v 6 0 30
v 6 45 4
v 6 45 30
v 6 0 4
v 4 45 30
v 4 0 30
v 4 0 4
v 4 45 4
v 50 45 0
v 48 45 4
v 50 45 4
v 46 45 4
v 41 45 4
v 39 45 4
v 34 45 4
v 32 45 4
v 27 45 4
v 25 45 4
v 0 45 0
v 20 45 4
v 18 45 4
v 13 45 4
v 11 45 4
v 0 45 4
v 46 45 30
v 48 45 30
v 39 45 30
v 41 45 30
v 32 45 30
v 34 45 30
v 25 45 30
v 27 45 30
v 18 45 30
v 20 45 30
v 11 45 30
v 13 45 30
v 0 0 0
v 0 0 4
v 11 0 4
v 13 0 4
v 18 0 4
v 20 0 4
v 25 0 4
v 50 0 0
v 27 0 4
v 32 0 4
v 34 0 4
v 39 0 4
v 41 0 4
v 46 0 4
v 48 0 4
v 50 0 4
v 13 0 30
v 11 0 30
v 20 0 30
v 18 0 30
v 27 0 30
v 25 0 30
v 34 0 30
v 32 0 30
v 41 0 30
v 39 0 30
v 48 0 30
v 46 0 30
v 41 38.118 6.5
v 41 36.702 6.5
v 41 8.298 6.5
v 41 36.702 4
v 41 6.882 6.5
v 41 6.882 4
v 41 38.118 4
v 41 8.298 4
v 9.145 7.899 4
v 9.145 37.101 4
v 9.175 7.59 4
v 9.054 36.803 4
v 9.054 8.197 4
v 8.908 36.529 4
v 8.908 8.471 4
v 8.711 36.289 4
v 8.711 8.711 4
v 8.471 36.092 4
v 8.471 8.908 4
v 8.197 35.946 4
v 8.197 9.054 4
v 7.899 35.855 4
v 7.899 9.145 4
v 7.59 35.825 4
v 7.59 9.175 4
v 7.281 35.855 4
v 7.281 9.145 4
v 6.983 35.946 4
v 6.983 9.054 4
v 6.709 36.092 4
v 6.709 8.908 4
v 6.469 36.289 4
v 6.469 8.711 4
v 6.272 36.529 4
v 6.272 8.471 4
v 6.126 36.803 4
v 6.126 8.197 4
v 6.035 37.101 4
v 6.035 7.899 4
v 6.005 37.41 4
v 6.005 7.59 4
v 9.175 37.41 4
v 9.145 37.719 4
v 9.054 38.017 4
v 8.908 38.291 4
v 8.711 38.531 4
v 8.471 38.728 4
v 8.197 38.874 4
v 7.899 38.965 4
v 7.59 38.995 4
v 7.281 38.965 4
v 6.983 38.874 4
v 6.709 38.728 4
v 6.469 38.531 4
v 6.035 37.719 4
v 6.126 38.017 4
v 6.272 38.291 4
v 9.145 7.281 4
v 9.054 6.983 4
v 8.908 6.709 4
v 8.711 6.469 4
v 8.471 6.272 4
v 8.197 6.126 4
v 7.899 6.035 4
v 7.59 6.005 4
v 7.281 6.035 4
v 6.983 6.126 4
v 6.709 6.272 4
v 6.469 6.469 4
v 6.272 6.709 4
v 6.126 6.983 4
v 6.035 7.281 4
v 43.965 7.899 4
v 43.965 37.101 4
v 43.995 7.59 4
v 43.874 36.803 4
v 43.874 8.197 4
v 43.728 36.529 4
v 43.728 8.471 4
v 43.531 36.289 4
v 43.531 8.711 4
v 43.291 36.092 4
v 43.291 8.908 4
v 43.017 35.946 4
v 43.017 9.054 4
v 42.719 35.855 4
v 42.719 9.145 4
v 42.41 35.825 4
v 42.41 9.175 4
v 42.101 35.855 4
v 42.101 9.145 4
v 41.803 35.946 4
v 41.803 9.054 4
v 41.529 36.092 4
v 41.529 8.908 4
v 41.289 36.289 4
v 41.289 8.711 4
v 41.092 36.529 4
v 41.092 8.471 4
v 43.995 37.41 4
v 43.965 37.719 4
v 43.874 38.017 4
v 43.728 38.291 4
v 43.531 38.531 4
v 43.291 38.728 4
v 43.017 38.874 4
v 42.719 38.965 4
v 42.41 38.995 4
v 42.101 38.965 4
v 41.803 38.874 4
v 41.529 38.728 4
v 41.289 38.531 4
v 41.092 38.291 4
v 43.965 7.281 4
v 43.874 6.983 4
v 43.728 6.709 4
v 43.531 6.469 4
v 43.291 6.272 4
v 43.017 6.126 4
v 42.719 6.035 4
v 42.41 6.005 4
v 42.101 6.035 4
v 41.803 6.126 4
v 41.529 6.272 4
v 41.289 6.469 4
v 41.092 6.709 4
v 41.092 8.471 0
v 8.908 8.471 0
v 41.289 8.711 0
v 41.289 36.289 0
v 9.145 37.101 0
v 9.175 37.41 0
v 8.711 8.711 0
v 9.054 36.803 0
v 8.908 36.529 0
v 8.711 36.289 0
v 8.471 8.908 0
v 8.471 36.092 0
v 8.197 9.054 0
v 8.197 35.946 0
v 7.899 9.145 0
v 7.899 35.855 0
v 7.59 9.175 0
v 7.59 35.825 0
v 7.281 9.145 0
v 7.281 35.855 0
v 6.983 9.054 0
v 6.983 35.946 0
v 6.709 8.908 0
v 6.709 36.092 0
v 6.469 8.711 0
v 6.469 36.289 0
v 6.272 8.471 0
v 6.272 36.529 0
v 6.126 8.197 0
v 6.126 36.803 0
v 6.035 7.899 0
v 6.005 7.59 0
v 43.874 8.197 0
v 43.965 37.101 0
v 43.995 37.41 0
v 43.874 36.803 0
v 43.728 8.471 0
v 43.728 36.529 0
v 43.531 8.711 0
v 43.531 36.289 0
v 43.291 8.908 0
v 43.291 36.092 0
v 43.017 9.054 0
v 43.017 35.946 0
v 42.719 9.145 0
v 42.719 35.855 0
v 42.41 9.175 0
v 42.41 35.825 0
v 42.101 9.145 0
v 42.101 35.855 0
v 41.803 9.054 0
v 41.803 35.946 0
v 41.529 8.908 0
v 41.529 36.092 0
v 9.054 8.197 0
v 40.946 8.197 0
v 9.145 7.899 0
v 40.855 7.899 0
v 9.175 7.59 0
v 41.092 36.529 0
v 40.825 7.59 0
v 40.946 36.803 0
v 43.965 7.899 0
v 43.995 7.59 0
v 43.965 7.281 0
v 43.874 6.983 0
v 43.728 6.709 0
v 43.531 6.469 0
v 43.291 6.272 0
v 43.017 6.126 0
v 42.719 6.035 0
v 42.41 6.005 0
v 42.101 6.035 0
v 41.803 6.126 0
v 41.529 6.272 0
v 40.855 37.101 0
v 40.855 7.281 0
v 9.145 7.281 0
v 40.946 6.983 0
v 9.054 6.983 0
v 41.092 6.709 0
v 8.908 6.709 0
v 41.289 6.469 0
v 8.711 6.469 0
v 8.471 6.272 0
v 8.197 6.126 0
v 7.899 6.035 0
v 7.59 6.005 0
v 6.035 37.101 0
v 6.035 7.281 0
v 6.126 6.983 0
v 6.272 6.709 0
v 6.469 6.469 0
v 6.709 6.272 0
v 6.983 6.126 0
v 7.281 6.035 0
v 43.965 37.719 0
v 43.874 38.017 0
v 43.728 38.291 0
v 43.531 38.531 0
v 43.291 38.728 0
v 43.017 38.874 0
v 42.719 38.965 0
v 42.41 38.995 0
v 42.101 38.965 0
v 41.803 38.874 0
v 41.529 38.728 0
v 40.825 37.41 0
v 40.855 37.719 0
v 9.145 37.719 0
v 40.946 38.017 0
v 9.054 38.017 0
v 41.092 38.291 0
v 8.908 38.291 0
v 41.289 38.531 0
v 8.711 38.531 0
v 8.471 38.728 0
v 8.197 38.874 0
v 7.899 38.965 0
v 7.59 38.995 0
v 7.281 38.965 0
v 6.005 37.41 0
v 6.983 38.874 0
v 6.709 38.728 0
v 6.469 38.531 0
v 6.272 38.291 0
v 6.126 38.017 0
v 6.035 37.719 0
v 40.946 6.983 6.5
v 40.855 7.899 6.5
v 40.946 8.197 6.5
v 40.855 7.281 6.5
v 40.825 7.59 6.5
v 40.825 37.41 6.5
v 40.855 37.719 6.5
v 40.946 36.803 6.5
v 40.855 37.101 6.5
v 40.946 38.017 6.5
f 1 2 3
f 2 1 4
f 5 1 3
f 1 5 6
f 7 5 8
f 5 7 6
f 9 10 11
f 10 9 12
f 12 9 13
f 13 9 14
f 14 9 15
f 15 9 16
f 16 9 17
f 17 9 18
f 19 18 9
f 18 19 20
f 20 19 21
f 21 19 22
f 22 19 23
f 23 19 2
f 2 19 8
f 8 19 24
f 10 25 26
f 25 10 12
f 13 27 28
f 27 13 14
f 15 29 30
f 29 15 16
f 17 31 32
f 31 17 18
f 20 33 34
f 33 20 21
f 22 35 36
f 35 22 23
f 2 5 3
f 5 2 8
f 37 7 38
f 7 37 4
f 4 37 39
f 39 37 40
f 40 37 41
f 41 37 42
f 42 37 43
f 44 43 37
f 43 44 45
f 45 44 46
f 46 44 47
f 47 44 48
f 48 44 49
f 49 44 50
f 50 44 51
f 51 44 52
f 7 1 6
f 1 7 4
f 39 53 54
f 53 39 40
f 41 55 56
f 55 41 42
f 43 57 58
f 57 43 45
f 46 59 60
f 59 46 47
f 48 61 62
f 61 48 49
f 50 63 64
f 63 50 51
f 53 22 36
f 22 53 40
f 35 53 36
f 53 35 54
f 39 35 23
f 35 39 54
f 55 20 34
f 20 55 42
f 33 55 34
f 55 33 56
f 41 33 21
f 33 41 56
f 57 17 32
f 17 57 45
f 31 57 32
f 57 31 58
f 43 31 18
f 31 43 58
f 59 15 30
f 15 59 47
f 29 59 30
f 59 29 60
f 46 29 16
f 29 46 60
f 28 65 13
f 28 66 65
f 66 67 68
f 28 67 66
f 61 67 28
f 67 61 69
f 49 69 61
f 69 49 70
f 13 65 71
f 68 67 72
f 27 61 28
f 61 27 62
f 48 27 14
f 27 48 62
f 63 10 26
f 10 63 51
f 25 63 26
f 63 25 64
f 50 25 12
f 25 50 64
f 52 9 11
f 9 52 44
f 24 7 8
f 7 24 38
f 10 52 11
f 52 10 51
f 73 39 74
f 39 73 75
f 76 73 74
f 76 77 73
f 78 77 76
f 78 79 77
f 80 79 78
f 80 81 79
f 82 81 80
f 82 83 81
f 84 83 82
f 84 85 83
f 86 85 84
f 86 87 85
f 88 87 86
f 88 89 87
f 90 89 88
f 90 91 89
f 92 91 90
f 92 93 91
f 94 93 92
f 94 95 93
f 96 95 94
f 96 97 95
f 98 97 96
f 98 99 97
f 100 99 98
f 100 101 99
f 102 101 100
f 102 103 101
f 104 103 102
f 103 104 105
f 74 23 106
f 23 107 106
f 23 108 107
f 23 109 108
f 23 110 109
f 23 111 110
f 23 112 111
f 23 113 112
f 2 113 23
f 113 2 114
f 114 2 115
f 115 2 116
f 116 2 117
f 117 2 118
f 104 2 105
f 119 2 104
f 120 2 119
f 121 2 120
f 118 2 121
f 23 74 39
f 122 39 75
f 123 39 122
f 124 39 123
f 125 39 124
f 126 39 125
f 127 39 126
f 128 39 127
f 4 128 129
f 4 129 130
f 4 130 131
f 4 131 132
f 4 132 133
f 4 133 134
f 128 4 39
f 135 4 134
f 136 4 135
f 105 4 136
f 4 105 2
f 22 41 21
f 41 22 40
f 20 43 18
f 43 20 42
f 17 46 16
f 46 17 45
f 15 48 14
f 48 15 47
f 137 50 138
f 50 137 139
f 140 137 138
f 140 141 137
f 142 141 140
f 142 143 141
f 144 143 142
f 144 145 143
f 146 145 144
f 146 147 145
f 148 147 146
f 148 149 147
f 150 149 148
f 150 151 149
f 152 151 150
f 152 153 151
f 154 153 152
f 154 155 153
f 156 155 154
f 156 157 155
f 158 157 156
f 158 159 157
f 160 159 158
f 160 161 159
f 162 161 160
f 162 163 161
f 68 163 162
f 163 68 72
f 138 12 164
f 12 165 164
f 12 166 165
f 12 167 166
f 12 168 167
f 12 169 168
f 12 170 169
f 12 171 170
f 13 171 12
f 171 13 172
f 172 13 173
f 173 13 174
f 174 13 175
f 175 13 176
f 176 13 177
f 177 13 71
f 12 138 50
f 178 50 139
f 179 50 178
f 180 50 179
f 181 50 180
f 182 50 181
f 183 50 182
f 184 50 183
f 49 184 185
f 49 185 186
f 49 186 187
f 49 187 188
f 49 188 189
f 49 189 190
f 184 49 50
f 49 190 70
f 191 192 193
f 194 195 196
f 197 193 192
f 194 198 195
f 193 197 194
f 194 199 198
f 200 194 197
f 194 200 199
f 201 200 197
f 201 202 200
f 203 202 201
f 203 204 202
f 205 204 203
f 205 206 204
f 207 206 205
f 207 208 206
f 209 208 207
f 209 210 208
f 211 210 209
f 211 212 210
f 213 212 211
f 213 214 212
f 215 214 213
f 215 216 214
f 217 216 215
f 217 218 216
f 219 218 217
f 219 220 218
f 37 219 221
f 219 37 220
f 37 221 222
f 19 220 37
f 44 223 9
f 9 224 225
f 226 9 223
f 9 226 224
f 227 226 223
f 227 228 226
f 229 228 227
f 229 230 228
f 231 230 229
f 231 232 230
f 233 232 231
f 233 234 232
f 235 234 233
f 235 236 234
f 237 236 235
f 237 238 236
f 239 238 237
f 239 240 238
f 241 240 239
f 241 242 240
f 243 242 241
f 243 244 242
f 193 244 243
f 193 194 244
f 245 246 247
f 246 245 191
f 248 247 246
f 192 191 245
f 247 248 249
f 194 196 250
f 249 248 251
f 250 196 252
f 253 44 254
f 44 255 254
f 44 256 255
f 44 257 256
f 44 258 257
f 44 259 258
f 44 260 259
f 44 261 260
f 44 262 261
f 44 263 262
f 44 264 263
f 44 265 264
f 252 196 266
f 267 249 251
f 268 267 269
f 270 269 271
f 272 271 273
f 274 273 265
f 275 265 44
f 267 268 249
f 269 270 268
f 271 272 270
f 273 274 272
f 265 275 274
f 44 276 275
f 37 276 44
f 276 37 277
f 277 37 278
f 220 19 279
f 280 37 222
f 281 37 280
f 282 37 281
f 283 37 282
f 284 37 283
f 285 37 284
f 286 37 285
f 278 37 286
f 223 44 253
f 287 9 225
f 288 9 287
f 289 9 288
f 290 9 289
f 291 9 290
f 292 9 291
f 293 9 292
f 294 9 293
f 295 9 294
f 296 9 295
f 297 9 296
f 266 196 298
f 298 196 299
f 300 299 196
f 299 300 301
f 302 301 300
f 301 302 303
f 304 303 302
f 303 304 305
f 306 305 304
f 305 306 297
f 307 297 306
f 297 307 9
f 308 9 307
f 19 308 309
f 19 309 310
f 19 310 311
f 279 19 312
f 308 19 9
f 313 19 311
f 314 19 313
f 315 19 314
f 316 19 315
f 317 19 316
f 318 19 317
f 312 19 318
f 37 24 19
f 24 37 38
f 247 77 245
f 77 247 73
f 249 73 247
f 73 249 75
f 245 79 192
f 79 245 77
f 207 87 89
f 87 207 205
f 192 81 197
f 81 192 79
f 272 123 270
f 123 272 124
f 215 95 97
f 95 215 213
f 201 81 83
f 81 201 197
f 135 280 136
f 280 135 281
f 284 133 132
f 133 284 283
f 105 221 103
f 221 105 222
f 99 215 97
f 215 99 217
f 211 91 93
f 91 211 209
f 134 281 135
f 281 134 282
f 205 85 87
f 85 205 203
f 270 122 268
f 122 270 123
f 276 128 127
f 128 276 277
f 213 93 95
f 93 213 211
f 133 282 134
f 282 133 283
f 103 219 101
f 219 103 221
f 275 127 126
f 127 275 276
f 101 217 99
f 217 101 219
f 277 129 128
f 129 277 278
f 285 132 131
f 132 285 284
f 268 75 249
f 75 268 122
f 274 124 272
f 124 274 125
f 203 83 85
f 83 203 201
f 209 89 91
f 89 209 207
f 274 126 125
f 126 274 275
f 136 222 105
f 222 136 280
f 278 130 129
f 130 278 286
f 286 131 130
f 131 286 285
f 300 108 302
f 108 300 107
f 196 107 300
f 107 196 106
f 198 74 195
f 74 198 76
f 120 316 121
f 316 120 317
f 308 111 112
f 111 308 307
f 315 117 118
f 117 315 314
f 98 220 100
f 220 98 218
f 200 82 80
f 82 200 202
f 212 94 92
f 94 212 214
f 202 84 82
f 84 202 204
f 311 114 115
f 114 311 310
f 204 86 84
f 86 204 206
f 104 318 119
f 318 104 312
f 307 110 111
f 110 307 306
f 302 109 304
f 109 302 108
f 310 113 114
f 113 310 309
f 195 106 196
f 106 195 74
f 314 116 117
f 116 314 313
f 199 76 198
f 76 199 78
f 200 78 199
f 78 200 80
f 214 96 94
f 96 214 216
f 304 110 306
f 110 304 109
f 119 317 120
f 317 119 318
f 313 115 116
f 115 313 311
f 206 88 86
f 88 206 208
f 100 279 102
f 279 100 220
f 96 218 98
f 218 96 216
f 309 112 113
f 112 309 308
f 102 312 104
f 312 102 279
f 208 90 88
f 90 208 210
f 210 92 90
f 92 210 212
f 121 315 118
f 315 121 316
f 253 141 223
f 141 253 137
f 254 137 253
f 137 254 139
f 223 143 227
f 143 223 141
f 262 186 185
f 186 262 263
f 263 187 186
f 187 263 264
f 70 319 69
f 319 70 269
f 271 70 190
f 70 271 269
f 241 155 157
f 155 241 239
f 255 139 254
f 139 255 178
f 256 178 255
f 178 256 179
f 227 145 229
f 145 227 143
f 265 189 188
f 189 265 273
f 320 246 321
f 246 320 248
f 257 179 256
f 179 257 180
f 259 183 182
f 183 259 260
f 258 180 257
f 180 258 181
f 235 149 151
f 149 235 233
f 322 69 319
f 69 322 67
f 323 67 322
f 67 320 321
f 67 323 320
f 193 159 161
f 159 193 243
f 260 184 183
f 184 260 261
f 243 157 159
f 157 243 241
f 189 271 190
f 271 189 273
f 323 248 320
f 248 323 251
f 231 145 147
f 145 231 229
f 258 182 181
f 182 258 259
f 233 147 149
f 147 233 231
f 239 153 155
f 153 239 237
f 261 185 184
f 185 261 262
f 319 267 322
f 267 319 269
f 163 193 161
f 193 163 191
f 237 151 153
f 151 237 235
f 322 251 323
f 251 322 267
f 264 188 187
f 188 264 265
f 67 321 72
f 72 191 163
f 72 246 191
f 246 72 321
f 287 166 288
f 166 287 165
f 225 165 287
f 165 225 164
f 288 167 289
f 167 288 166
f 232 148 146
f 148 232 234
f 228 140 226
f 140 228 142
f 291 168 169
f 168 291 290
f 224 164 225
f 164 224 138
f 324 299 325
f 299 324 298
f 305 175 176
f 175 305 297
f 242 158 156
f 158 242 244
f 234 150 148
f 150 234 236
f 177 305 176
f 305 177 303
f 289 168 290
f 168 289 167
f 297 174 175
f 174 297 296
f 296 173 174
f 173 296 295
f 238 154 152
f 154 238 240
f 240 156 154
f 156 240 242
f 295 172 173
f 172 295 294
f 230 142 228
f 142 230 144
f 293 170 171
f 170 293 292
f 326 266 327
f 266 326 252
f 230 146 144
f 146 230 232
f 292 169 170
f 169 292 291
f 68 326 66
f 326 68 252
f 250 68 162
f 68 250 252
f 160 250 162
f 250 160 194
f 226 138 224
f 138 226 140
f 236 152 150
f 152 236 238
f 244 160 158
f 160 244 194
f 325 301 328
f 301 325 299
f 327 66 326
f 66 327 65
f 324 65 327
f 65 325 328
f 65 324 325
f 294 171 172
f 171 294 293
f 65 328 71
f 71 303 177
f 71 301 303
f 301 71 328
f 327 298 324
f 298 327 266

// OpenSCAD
$fn = 32;

// ----------------------------------------------------------------------
// Finned heat sink: 50 x 45 mm base, 26 mm fins
// ----------------------------------------------------------------------

// --- parameters (mm) ---
base_w = 50;              // base width
base_d = 45;              // base depth
base_t = 4;               // base thickness
fin_h = 26;               // fin height above the base
holes_d = 3.17;           // fixing holes
hole_x = 17.41;           // hole offset in x
hole_y = 14.91;           // hole offset in y
fin_t = 2;                // fin thickness
fin_pitch = 7;            // fin pitch
fin_count = 7;            // number of fins
fin_x0 = 4;               // first fin offset

difference() {
  union() {
    cube([base_w, base_d, base_t]);
    for (i = [0 : fin_count - 1]) {
      translate([fin_x0 + i * fin_pitch, 0, base_t - 0.5]) cube([fin_t, base_d, fin_h + 0.5]);
    }
  }
  /* fixing holes through the base, 2.5 mm clear on both sides */
  for (hx = [-17.41, 17.41]) {
    for (hy = [-14.91, 14.91]) {
      translate([base_w / 2 + hx, base_d / 2 + hy, -2.5]) cylinder(h = base_t + 5, d = holes_d);
    }
  }
}
